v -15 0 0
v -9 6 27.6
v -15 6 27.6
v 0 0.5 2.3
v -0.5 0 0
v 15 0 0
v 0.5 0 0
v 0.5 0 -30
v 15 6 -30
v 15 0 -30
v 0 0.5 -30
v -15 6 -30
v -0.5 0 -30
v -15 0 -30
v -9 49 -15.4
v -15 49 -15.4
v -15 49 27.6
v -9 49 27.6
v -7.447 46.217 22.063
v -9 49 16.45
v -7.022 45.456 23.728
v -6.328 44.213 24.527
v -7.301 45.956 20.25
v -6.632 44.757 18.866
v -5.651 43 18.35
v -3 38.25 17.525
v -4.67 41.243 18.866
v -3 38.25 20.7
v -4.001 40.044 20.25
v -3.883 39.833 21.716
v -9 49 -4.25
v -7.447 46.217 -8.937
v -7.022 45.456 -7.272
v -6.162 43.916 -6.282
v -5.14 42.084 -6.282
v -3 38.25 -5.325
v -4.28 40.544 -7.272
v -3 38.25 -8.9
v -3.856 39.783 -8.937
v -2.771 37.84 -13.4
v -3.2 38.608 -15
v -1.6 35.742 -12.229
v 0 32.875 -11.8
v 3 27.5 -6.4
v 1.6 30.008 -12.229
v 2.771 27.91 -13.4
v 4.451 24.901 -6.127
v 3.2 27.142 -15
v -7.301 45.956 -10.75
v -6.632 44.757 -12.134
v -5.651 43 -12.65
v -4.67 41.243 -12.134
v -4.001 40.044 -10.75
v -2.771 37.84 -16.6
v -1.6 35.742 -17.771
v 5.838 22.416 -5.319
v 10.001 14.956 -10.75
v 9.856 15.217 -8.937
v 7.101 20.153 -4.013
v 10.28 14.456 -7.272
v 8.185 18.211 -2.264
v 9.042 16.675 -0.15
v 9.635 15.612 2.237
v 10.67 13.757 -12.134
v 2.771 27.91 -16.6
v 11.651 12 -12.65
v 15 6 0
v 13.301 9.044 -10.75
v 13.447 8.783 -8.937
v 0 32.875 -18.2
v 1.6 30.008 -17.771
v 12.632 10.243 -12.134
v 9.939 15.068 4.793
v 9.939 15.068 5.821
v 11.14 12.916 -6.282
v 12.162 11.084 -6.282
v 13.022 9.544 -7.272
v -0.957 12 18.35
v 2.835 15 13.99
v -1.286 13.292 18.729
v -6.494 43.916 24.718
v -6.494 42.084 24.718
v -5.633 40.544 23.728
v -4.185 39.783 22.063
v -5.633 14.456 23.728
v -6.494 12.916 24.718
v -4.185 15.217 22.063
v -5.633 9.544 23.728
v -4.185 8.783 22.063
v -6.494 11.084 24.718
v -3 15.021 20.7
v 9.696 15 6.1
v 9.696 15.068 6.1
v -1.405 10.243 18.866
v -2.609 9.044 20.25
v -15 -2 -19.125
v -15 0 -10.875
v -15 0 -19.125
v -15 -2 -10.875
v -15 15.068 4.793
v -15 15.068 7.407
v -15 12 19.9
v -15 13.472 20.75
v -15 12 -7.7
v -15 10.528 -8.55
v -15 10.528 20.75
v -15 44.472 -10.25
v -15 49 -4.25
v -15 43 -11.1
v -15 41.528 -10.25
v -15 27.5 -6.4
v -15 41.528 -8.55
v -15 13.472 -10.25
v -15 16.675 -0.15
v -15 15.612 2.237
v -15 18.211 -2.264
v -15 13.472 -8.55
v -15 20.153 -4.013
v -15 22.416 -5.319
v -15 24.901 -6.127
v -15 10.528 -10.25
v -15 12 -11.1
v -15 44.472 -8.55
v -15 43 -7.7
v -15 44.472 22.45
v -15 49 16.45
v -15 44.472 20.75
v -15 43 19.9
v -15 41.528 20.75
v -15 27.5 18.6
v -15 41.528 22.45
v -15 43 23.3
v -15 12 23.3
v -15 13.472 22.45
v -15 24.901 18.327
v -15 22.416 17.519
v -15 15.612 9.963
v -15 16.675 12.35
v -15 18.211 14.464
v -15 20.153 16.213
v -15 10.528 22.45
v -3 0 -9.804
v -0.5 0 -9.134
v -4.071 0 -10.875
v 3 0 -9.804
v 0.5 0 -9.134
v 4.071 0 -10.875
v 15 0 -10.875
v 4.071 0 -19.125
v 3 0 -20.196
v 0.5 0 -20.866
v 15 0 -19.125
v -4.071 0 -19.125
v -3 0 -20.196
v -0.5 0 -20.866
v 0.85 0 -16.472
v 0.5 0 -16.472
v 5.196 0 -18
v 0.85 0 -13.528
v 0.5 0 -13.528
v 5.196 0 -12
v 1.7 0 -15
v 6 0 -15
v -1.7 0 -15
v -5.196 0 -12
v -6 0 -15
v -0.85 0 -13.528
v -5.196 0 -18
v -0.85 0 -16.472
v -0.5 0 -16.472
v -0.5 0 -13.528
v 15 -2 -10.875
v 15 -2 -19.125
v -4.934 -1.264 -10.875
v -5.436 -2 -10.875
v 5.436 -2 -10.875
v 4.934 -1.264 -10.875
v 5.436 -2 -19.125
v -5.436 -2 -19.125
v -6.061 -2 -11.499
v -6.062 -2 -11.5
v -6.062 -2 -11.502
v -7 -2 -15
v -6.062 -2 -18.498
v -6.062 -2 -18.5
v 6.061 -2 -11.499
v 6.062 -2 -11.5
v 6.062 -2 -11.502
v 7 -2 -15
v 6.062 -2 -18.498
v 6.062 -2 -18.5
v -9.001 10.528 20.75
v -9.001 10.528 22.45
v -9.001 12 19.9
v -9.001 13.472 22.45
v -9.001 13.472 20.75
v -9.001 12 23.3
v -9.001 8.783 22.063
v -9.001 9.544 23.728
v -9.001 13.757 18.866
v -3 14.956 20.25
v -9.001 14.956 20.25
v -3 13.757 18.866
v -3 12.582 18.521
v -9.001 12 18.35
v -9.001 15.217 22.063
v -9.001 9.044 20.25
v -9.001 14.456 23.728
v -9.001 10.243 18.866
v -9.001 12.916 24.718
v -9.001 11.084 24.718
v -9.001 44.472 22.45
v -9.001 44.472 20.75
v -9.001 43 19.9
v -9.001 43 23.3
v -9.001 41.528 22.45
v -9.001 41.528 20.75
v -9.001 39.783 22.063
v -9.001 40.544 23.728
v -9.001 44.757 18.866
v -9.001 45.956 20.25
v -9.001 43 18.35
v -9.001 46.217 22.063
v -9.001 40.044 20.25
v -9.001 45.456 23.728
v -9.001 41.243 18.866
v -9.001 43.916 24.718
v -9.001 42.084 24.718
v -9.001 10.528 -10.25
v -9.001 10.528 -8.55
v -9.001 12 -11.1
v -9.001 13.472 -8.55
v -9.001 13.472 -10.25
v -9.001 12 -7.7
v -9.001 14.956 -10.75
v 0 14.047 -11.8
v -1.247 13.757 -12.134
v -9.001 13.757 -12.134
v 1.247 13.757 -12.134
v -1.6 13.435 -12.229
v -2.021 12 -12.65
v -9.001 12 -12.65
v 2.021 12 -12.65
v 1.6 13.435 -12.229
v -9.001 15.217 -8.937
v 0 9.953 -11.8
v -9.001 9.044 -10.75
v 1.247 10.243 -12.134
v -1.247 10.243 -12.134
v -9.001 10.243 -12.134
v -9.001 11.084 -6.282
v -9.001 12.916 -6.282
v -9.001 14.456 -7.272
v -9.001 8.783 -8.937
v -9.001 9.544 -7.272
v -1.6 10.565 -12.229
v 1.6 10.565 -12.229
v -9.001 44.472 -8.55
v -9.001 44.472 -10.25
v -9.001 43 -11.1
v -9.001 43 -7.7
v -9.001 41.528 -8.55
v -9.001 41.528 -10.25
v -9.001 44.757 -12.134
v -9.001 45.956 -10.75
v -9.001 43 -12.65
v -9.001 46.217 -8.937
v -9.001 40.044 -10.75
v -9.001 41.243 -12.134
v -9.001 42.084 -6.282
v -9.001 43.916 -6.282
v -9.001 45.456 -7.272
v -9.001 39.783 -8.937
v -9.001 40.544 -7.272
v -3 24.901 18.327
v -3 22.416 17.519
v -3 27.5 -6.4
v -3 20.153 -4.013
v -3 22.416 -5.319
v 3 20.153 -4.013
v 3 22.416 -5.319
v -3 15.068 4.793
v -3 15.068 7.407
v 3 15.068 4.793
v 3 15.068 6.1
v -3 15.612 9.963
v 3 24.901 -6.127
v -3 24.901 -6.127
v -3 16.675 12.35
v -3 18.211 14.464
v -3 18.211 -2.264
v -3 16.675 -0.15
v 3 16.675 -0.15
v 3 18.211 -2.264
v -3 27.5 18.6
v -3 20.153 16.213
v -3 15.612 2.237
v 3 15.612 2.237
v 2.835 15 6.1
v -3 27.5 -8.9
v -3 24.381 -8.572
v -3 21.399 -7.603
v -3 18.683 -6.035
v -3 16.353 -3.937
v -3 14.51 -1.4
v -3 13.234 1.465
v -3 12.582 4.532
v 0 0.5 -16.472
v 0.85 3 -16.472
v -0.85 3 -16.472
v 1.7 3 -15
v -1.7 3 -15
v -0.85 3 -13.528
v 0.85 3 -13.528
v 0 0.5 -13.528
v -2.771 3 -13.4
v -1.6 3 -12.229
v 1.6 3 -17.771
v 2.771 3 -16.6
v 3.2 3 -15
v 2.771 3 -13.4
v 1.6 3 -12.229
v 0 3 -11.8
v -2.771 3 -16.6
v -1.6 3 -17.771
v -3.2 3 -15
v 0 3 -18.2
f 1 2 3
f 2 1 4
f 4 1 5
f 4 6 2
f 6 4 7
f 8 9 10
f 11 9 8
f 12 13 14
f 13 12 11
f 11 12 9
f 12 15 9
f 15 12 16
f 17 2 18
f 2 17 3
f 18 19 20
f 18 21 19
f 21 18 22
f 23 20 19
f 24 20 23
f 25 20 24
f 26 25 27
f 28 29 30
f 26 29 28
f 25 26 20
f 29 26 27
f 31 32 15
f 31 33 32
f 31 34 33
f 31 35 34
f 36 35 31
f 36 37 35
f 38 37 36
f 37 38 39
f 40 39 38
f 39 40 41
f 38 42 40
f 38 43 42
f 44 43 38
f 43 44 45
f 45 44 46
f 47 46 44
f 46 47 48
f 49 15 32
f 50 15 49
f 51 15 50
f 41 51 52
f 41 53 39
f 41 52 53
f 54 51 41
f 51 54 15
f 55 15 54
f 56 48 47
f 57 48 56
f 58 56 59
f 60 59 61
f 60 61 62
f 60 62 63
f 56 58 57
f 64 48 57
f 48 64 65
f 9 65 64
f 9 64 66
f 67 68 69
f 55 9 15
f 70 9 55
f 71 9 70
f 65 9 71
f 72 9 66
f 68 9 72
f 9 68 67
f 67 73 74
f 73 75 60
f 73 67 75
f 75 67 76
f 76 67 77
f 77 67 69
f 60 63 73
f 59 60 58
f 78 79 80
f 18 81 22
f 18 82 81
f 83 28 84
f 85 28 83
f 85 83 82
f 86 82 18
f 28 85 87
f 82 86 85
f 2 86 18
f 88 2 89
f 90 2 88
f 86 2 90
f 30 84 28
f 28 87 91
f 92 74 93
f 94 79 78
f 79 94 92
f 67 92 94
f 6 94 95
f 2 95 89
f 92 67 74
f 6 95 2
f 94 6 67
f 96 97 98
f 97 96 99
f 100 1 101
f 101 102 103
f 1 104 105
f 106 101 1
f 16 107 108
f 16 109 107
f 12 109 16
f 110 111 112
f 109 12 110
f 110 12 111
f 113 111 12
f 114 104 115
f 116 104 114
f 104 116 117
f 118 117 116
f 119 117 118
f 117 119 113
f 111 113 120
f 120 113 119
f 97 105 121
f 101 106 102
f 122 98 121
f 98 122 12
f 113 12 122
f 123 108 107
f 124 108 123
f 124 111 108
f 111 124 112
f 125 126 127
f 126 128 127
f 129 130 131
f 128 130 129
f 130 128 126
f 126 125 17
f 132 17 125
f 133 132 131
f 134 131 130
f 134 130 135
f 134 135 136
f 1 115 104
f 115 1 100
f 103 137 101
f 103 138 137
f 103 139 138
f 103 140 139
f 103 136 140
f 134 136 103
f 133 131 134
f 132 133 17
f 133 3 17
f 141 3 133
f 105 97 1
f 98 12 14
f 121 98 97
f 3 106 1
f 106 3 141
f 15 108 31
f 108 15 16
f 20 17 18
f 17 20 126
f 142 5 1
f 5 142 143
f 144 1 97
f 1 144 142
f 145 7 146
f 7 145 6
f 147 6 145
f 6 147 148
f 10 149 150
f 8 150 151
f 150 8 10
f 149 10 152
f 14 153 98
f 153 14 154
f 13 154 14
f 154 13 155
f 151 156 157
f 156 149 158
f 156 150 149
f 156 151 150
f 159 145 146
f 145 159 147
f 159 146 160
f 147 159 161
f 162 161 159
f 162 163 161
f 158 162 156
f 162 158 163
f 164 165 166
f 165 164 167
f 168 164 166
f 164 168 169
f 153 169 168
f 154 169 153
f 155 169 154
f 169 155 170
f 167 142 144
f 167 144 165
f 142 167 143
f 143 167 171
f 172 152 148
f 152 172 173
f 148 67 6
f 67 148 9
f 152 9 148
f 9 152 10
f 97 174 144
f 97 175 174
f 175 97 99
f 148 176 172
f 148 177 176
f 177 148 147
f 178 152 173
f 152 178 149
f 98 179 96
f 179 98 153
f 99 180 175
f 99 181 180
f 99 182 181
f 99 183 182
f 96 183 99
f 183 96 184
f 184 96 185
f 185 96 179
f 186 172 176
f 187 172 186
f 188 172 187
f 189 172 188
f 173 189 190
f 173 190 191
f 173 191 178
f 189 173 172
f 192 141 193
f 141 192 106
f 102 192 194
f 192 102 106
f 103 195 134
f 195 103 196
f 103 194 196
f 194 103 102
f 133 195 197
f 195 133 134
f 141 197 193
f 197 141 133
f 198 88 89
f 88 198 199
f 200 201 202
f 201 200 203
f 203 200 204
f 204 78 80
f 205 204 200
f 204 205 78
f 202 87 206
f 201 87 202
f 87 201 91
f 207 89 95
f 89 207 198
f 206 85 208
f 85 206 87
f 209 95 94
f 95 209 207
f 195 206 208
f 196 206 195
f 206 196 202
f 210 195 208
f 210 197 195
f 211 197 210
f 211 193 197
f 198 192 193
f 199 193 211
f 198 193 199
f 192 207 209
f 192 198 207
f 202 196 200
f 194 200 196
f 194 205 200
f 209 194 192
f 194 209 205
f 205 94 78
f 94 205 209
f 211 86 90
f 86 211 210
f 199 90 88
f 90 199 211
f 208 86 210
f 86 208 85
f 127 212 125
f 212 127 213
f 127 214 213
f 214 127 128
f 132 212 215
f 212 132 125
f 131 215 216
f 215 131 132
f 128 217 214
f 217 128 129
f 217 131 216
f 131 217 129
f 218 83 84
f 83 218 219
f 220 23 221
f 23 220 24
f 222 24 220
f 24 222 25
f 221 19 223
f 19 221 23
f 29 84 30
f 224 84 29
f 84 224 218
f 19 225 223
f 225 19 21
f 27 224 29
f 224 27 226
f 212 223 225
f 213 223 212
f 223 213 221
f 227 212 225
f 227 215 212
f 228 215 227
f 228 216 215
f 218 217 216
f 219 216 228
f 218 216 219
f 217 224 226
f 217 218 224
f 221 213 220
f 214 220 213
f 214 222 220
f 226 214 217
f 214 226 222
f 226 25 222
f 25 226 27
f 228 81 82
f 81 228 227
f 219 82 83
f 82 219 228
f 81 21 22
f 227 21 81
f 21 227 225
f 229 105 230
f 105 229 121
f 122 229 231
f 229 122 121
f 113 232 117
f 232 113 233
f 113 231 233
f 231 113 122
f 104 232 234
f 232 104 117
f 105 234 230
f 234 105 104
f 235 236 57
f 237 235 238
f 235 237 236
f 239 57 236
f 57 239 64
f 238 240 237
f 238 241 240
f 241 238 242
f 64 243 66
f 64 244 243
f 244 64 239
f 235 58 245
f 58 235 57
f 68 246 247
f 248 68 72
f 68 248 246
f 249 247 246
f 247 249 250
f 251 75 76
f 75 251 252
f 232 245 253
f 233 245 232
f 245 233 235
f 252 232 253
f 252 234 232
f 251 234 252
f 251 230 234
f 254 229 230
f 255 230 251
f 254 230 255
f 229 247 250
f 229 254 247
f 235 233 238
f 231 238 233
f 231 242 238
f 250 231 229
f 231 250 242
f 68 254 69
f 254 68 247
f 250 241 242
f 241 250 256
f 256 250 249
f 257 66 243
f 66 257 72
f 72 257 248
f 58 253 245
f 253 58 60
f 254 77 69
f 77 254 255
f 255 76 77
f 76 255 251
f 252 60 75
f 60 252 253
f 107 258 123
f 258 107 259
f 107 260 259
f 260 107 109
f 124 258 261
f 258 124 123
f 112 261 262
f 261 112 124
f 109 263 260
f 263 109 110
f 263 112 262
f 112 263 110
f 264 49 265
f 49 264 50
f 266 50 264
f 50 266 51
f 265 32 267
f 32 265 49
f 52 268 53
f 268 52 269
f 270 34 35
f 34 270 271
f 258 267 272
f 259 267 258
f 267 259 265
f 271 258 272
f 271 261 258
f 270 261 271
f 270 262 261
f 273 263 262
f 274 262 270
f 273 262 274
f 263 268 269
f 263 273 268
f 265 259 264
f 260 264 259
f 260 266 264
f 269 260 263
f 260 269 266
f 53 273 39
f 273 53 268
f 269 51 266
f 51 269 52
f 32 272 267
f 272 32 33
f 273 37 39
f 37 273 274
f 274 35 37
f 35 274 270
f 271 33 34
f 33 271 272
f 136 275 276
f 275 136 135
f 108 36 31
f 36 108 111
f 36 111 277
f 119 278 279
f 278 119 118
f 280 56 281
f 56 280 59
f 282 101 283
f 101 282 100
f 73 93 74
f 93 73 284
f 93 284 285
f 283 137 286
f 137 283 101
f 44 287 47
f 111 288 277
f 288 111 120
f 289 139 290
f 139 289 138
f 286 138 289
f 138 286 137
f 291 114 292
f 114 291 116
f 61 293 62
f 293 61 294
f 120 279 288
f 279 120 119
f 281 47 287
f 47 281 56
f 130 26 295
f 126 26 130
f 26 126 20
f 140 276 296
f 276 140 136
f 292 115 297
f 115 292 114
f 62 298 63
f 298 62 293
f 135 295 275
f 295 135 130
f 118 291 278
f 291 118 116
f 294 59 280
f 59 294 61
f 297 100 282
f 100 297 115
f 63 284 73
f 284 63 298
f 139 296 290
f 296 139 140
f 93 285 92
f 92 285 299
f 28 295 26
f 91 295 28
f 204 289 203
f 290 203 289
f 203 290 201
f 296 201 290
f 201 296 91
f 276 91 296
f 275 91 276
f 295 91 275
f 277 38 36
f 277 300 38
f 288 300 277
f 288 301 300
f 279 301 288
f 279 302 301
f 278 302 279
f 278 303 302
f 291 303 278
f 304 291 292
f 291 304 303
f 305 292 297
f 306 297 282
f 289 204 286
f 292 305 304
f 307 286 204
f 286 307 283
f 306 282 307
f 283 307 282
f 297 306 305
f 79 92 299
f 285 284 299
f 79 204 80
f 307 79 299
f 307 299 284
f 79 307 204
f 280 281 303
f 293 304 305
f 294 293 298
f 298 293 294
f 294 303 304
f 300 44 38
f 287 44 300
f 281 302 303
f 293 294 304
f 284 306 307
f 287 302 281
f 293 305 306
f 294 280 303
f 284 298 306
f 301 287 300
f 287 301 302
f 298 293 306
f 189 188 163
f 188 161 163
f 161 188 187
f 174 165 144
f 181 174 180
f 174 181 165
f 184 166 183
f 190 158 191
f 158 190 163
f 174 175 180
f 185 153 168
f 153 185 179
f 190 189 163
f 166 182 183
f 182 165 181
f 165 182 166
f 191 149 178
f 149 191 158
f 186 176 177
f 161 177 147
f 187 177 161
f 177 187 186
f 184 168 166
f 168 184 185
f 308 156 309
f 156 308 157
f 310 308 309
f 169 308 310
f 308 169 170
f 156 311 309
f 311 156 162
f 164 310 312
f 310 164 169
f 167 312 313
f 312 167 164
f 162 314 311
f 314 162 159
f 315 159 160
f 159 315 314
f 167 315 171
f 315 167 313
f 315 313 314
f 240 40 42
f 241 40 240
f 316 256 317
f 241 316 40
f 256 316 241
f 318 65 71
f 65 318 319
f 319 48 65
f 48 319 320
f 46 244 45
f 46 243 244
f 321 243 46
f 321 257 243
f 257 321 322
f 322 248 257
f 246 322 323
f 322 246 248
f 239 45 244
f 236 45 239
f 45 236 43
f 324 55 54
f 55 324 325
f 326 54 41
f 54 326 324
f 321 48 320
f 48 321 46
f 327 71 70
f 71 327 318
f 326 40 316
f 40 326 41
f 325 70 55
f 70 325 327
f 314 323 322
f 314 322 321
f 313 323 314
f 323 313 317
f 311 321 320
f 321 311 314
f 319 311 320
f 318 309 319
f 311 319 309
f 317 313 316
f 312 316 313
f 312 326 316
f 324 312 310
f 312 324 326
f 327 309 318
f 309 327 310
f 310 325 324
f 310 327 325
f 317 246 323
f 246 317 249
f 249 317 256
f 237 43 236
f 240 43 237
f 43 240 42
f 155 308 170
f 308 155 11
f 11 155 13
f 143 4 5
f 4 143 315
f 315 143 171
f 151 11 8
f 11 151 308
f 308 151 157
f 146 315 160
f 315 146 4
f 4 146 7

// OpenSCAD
// file: common_dimensions.scad
x_rod_distance = 45;

thinwall = 3;

belt_width = 6;
belt_thickness = 1.5;

// Account for idler bearing and stepper pinion being different diameters
x_stepper_pinion_od = 12.0;
x_idler_bearing_od = 9.8; // 608 bearing
x_idler_bearing_id = 3.0; // 608 bearing
x_idler_bearing_width = 8.5; // 608 bearing
x_idler_to_stepper_offset = (x_stepper_pinion_od-x_idler_bearing_od)/2; 


// T8 NUT dimensions
t8nut_od = 22.0;
t8nut_id = 10.25; // 10.25; // 10.25 actual, 12.0 for spring on anti-backlash nut
t8nut_id_clearance = 14.0 + 3; // 
//t8nut_id = 10.2; //10.2 actual

// Z rod/bearing dimensions
z_rod_diam = 10.0; 
z_rod_diam_tight = z_rod_diam - 0.07; // Adjust diam based on test prints
z_bearing_diam = 19.0; // LM10UU
z_bearing_length = 29.0; // LM10UU

// X rod/bearing dimensions
x_rod_diam = 10.0; 
x_rod_diam_tight = x_rod_diam - 0.07; // Adjust tightness based on test prints
x_bearing_diam = 19.0; // LM10UU
x_bearing_length = 29.0; // LM10UU

z_bottom_wall_width = 4;
z_bottom_width = 43 + 2*z_bottom_wall_width;
z_bottom_height = 43;

z_top_wall_width = z_bottom_wall_width;
z_top_width = 30;
z_top_height = 22;
z_top_generate_rod_holder = false; // Optionally generate a Z rod holder, which limits the length of the Z rod, or no holder, which allows a longer Z rod to be used.

z_rod_to_rail = z_bottom_wall_width + 43/2 + 3; // Z-rod center (and X-axis) offset from 3030 rail front face - dictated by NEMA17 stepper center (44mm / side)
z_rod_to_base = t8nut_id_clearance/2 + 1; // Z-rod center offset from x-end front face

z_motor_ofs = z_bearing_diam/2 + thinwall + t8nut_id_clearance/2 + 1; //17; // Z-motor offset from Z-rod (center-to-center) - both are aligned with X axis

z_beam_motor_ofs = 10; // Z-rod center offset from Z beam center

x_end_belt_hole_height = x_rod_distance-x_rod_diam-2*thinwall; //31-5; // To fit between NEMA17 mounting screws
x_end_belt_hole_width = x_idler_bearing_width+1; // x_end_base_depth-2*thinwall; // 10;
x_end_base_height = x_rod_distance + x_rod_diam + 2*thinwall; //58 + 10;
x_end_base_depth = 18; // x_end_belt_hole_width + 2*thinwall; //18; //17; // NOTE: Manually adjust to prevent X rod cutout interference with Z linear bearing cutouts
x_end_base_width = x_bearing_diam + 2*thinwall + 1 + 8+4;
x_end_idler_open_end = true; // Specify whether x-idler end has closed ends with tension screws, or straight rod cutouts to allow longer rods.

x_to_z_offset = x_end_base_depth/2+z_rod_to_base; // 15; // Used to offset the X pushrods/belt from the Z rod.

z_bearing_size = z_bearing_diam + 2 * thinwall;

y_rod_diam = 10.0;
y_rod_diam_tight = y_rod_diam - 0.0; // Adjust tightness based on test prints
y_rod_to_rail = 2*thinwall + y_rod_diam/2; // y rod center to 3030 rail.  11+4 from Haribo holder with 8mm rod. Use 2x thinwall to give room for ziptie hole.
y_rod_screw_diam = 3.0;

// 16T gt2 bearing
y_idler_bearing_od = 9.8; 
y_idler_bearing_id = 3.0; 
y_idler_bearing_width = 8.5; 

// Dimensions of the Y beltholder component (the sliding piece)
y_beltholder_width = 18;
y_beltholder_height = 2 + 9 + 2;
y_beltholder_depth = 6 + 2;

// Dimensions of the Y beltholder base component (that mounts to the plate)
y_beltholder_base_height = 9 + y_beltholder_height + 2;
y_beltholder_base_width = 2*y_beltholder_width + 10;
y_beltholder_base_depth = y_beltholder_depth + 8;

y_belt_to_plate = 9 + y_beltholder_height/2;
y_idler_to_plate = y_belt_to_plate + y_idler_bearing_od/2;

//y_plate_to_belt = 2*thinwall; // Bottom of plate to top of belt

y_bearing_od = 19.0; // LM10uu
y_bearing_length = 29.0; // LM10uu

y_bearing_holder_width = 50;
y_bearing_holder_depth = y_bearing_length;
y_bearing_holder_rod_ofs = thinwall*2 + y_bearing_od/2; // Offset from Y rod to mounting plate.  Use 2x thinwall to give room for ziptie hole.
y_bearing_holder_height = y_bearing_holder_rod_ofs+y_bearing_od*0.25;

y_rail_to_plate = y_rod_to_rail + y_bearing_holder_rod_ofs; // Offset from top of 3030 rail to bottom of mounting plate
y_rail_to_idler = y_rail_to_plate - y_idler_to_plate; // Offset from top of 3030 rail to center of idler (and stepper)

z_railguide_width = 8.30; // 3030
z_railguide_depth = 2.0;
z_railguide_keepout = 12; // 3030 dropin nut is 11, plus margin
// main file
// PRUSA iteration3
// Y motor mount
// GNU GPL v3
// Josef Průša <iam@josefprusa.cz> and contributors
// http://www.reprap.org/wiki/Prusa_Mendel
// http://prusamendel.org

include <common_dimensions.scad>

y_idler_width = 30;

module y_motor_base(){

    hull() {
        translate([-y_idler_width/2,0,-30]) rotate([0,0,0]) cube([y_idler_width,6,30]);
        translate([-y_idler_width/2,6,-43/2+y_rail_to_idler]) cube([6,43,43]);
    }
        %translate([0,43/2+6,y_rail_to_idler]) rotate([0,90,0]) cylinder(d=y_idler_bearing_od, h=y_idler_bearing_width, $fn=60, center=true);

    // Rail guide + support
    translate([-y_idler_width/2,-z_railguide_depth,-15-8.25/2]) cube([y_idler_width,z_railguide_depth,8.25]);    
    /*for (i=[0,1]) mirror([i,0,0]) {
        translate([-y_idler_width/2,-z_railguide_depth,-15-8.25/2]) cube([(y_idler_width-z_railguide_keepout-1)/2,z_railguide_depth,8.25]);
        translate([-y_idler_width/2,-z_railguide_depth-0.5,-30]) cube([(y_idler_width-z_railguide_keepout-1)/2,1,15-8.25/2]);
        translate([-y_idler_width/2,-z_railguide_depth-0.5-4,-30]) cube([(y_idler_width-z_railguide_keepout-1)/2,4,1]);
    }*/

}

module y_motor_holes(){
    translate([-15-0.001,6+43/2,y_rail_to_idler]) rotate([0,90,0]) {
        for (x=[-1,1]) for (y=[-1,1]) {
            translate([x*31/2,y*31/2,0]) cylinder(d=3.4, h=200, center=false);
            translate([x*31/2,y*31/2,6]) cylinder(d=6.5, h=200, center=false);
        }
        hull() {
            cylinder(d=25, h=200, center=false);
            translate([0,50,0]) cylinder(d=15, h=200, center=false);
        }
        //translate([0,0,15-3]) cylinder(d=28, h=200, center=false);
        //translate([0,0,15+3]) cylinder(d=31, h=200, center=false);
        
    }
    
    // Belt positioning helper.  When viewed from above, will give proper alignment for edge of belt.
    //translate([-3,43/2+6-14,y_rail_to_idler]) cube([25,100,25]);
    //translate([+3,43/2+6-16,y_rail_to_idler]) cube([25,100,25]);

    translate([-3,43/2+6-12.5,y_rail_to_idler]) cube([25,100,25]);
    hull() {
        translate([-3,43/2+6,y_rail_to_idler])  rotate([0,90,0]) cylinder(d2=25, d1=30, h=6, center=false);
        translate([-3,43/2+6,y_rail_to_idler+50])  rotate([0,90,0]) cylinder(d2=25, d1=30, h=6, center=false);
        translate([-3,43/2+6+50,y_rail_to_idler])  rotate([0,90,0]) cylinder(d2=25, d1=30, h=6, center=false);
    }
    
    // Rail guide nut cutouts
    translate([0,0,-15]) rotate([90,0,0]) cylinder(h = z_railguide_depth+0.001, d2=z_railguide_keepout+2, d1=z_railguide_keepout, $fn=12);    
    translate([0,0,-15]) rotate([-90,0,0]) cylinder(h = 100, d=3.4, $fn=6);    
    translate([0,3,-15]) rotate([-90,0,0]) cylinder(h = 100, d=6.4, $fn=12);    
    
    rotate([0,0,0]) cylinder(h = 100, d = 1, $fn = 4, center = true);
}




//#translate([18,40,10]) cube([8, 5, 5]);	

// Final part
module y_motor(){
    difference(){
        y_motor_base();
        y_motor_holes();
    }
}

y_motor();

module nema17_holes() {

}
